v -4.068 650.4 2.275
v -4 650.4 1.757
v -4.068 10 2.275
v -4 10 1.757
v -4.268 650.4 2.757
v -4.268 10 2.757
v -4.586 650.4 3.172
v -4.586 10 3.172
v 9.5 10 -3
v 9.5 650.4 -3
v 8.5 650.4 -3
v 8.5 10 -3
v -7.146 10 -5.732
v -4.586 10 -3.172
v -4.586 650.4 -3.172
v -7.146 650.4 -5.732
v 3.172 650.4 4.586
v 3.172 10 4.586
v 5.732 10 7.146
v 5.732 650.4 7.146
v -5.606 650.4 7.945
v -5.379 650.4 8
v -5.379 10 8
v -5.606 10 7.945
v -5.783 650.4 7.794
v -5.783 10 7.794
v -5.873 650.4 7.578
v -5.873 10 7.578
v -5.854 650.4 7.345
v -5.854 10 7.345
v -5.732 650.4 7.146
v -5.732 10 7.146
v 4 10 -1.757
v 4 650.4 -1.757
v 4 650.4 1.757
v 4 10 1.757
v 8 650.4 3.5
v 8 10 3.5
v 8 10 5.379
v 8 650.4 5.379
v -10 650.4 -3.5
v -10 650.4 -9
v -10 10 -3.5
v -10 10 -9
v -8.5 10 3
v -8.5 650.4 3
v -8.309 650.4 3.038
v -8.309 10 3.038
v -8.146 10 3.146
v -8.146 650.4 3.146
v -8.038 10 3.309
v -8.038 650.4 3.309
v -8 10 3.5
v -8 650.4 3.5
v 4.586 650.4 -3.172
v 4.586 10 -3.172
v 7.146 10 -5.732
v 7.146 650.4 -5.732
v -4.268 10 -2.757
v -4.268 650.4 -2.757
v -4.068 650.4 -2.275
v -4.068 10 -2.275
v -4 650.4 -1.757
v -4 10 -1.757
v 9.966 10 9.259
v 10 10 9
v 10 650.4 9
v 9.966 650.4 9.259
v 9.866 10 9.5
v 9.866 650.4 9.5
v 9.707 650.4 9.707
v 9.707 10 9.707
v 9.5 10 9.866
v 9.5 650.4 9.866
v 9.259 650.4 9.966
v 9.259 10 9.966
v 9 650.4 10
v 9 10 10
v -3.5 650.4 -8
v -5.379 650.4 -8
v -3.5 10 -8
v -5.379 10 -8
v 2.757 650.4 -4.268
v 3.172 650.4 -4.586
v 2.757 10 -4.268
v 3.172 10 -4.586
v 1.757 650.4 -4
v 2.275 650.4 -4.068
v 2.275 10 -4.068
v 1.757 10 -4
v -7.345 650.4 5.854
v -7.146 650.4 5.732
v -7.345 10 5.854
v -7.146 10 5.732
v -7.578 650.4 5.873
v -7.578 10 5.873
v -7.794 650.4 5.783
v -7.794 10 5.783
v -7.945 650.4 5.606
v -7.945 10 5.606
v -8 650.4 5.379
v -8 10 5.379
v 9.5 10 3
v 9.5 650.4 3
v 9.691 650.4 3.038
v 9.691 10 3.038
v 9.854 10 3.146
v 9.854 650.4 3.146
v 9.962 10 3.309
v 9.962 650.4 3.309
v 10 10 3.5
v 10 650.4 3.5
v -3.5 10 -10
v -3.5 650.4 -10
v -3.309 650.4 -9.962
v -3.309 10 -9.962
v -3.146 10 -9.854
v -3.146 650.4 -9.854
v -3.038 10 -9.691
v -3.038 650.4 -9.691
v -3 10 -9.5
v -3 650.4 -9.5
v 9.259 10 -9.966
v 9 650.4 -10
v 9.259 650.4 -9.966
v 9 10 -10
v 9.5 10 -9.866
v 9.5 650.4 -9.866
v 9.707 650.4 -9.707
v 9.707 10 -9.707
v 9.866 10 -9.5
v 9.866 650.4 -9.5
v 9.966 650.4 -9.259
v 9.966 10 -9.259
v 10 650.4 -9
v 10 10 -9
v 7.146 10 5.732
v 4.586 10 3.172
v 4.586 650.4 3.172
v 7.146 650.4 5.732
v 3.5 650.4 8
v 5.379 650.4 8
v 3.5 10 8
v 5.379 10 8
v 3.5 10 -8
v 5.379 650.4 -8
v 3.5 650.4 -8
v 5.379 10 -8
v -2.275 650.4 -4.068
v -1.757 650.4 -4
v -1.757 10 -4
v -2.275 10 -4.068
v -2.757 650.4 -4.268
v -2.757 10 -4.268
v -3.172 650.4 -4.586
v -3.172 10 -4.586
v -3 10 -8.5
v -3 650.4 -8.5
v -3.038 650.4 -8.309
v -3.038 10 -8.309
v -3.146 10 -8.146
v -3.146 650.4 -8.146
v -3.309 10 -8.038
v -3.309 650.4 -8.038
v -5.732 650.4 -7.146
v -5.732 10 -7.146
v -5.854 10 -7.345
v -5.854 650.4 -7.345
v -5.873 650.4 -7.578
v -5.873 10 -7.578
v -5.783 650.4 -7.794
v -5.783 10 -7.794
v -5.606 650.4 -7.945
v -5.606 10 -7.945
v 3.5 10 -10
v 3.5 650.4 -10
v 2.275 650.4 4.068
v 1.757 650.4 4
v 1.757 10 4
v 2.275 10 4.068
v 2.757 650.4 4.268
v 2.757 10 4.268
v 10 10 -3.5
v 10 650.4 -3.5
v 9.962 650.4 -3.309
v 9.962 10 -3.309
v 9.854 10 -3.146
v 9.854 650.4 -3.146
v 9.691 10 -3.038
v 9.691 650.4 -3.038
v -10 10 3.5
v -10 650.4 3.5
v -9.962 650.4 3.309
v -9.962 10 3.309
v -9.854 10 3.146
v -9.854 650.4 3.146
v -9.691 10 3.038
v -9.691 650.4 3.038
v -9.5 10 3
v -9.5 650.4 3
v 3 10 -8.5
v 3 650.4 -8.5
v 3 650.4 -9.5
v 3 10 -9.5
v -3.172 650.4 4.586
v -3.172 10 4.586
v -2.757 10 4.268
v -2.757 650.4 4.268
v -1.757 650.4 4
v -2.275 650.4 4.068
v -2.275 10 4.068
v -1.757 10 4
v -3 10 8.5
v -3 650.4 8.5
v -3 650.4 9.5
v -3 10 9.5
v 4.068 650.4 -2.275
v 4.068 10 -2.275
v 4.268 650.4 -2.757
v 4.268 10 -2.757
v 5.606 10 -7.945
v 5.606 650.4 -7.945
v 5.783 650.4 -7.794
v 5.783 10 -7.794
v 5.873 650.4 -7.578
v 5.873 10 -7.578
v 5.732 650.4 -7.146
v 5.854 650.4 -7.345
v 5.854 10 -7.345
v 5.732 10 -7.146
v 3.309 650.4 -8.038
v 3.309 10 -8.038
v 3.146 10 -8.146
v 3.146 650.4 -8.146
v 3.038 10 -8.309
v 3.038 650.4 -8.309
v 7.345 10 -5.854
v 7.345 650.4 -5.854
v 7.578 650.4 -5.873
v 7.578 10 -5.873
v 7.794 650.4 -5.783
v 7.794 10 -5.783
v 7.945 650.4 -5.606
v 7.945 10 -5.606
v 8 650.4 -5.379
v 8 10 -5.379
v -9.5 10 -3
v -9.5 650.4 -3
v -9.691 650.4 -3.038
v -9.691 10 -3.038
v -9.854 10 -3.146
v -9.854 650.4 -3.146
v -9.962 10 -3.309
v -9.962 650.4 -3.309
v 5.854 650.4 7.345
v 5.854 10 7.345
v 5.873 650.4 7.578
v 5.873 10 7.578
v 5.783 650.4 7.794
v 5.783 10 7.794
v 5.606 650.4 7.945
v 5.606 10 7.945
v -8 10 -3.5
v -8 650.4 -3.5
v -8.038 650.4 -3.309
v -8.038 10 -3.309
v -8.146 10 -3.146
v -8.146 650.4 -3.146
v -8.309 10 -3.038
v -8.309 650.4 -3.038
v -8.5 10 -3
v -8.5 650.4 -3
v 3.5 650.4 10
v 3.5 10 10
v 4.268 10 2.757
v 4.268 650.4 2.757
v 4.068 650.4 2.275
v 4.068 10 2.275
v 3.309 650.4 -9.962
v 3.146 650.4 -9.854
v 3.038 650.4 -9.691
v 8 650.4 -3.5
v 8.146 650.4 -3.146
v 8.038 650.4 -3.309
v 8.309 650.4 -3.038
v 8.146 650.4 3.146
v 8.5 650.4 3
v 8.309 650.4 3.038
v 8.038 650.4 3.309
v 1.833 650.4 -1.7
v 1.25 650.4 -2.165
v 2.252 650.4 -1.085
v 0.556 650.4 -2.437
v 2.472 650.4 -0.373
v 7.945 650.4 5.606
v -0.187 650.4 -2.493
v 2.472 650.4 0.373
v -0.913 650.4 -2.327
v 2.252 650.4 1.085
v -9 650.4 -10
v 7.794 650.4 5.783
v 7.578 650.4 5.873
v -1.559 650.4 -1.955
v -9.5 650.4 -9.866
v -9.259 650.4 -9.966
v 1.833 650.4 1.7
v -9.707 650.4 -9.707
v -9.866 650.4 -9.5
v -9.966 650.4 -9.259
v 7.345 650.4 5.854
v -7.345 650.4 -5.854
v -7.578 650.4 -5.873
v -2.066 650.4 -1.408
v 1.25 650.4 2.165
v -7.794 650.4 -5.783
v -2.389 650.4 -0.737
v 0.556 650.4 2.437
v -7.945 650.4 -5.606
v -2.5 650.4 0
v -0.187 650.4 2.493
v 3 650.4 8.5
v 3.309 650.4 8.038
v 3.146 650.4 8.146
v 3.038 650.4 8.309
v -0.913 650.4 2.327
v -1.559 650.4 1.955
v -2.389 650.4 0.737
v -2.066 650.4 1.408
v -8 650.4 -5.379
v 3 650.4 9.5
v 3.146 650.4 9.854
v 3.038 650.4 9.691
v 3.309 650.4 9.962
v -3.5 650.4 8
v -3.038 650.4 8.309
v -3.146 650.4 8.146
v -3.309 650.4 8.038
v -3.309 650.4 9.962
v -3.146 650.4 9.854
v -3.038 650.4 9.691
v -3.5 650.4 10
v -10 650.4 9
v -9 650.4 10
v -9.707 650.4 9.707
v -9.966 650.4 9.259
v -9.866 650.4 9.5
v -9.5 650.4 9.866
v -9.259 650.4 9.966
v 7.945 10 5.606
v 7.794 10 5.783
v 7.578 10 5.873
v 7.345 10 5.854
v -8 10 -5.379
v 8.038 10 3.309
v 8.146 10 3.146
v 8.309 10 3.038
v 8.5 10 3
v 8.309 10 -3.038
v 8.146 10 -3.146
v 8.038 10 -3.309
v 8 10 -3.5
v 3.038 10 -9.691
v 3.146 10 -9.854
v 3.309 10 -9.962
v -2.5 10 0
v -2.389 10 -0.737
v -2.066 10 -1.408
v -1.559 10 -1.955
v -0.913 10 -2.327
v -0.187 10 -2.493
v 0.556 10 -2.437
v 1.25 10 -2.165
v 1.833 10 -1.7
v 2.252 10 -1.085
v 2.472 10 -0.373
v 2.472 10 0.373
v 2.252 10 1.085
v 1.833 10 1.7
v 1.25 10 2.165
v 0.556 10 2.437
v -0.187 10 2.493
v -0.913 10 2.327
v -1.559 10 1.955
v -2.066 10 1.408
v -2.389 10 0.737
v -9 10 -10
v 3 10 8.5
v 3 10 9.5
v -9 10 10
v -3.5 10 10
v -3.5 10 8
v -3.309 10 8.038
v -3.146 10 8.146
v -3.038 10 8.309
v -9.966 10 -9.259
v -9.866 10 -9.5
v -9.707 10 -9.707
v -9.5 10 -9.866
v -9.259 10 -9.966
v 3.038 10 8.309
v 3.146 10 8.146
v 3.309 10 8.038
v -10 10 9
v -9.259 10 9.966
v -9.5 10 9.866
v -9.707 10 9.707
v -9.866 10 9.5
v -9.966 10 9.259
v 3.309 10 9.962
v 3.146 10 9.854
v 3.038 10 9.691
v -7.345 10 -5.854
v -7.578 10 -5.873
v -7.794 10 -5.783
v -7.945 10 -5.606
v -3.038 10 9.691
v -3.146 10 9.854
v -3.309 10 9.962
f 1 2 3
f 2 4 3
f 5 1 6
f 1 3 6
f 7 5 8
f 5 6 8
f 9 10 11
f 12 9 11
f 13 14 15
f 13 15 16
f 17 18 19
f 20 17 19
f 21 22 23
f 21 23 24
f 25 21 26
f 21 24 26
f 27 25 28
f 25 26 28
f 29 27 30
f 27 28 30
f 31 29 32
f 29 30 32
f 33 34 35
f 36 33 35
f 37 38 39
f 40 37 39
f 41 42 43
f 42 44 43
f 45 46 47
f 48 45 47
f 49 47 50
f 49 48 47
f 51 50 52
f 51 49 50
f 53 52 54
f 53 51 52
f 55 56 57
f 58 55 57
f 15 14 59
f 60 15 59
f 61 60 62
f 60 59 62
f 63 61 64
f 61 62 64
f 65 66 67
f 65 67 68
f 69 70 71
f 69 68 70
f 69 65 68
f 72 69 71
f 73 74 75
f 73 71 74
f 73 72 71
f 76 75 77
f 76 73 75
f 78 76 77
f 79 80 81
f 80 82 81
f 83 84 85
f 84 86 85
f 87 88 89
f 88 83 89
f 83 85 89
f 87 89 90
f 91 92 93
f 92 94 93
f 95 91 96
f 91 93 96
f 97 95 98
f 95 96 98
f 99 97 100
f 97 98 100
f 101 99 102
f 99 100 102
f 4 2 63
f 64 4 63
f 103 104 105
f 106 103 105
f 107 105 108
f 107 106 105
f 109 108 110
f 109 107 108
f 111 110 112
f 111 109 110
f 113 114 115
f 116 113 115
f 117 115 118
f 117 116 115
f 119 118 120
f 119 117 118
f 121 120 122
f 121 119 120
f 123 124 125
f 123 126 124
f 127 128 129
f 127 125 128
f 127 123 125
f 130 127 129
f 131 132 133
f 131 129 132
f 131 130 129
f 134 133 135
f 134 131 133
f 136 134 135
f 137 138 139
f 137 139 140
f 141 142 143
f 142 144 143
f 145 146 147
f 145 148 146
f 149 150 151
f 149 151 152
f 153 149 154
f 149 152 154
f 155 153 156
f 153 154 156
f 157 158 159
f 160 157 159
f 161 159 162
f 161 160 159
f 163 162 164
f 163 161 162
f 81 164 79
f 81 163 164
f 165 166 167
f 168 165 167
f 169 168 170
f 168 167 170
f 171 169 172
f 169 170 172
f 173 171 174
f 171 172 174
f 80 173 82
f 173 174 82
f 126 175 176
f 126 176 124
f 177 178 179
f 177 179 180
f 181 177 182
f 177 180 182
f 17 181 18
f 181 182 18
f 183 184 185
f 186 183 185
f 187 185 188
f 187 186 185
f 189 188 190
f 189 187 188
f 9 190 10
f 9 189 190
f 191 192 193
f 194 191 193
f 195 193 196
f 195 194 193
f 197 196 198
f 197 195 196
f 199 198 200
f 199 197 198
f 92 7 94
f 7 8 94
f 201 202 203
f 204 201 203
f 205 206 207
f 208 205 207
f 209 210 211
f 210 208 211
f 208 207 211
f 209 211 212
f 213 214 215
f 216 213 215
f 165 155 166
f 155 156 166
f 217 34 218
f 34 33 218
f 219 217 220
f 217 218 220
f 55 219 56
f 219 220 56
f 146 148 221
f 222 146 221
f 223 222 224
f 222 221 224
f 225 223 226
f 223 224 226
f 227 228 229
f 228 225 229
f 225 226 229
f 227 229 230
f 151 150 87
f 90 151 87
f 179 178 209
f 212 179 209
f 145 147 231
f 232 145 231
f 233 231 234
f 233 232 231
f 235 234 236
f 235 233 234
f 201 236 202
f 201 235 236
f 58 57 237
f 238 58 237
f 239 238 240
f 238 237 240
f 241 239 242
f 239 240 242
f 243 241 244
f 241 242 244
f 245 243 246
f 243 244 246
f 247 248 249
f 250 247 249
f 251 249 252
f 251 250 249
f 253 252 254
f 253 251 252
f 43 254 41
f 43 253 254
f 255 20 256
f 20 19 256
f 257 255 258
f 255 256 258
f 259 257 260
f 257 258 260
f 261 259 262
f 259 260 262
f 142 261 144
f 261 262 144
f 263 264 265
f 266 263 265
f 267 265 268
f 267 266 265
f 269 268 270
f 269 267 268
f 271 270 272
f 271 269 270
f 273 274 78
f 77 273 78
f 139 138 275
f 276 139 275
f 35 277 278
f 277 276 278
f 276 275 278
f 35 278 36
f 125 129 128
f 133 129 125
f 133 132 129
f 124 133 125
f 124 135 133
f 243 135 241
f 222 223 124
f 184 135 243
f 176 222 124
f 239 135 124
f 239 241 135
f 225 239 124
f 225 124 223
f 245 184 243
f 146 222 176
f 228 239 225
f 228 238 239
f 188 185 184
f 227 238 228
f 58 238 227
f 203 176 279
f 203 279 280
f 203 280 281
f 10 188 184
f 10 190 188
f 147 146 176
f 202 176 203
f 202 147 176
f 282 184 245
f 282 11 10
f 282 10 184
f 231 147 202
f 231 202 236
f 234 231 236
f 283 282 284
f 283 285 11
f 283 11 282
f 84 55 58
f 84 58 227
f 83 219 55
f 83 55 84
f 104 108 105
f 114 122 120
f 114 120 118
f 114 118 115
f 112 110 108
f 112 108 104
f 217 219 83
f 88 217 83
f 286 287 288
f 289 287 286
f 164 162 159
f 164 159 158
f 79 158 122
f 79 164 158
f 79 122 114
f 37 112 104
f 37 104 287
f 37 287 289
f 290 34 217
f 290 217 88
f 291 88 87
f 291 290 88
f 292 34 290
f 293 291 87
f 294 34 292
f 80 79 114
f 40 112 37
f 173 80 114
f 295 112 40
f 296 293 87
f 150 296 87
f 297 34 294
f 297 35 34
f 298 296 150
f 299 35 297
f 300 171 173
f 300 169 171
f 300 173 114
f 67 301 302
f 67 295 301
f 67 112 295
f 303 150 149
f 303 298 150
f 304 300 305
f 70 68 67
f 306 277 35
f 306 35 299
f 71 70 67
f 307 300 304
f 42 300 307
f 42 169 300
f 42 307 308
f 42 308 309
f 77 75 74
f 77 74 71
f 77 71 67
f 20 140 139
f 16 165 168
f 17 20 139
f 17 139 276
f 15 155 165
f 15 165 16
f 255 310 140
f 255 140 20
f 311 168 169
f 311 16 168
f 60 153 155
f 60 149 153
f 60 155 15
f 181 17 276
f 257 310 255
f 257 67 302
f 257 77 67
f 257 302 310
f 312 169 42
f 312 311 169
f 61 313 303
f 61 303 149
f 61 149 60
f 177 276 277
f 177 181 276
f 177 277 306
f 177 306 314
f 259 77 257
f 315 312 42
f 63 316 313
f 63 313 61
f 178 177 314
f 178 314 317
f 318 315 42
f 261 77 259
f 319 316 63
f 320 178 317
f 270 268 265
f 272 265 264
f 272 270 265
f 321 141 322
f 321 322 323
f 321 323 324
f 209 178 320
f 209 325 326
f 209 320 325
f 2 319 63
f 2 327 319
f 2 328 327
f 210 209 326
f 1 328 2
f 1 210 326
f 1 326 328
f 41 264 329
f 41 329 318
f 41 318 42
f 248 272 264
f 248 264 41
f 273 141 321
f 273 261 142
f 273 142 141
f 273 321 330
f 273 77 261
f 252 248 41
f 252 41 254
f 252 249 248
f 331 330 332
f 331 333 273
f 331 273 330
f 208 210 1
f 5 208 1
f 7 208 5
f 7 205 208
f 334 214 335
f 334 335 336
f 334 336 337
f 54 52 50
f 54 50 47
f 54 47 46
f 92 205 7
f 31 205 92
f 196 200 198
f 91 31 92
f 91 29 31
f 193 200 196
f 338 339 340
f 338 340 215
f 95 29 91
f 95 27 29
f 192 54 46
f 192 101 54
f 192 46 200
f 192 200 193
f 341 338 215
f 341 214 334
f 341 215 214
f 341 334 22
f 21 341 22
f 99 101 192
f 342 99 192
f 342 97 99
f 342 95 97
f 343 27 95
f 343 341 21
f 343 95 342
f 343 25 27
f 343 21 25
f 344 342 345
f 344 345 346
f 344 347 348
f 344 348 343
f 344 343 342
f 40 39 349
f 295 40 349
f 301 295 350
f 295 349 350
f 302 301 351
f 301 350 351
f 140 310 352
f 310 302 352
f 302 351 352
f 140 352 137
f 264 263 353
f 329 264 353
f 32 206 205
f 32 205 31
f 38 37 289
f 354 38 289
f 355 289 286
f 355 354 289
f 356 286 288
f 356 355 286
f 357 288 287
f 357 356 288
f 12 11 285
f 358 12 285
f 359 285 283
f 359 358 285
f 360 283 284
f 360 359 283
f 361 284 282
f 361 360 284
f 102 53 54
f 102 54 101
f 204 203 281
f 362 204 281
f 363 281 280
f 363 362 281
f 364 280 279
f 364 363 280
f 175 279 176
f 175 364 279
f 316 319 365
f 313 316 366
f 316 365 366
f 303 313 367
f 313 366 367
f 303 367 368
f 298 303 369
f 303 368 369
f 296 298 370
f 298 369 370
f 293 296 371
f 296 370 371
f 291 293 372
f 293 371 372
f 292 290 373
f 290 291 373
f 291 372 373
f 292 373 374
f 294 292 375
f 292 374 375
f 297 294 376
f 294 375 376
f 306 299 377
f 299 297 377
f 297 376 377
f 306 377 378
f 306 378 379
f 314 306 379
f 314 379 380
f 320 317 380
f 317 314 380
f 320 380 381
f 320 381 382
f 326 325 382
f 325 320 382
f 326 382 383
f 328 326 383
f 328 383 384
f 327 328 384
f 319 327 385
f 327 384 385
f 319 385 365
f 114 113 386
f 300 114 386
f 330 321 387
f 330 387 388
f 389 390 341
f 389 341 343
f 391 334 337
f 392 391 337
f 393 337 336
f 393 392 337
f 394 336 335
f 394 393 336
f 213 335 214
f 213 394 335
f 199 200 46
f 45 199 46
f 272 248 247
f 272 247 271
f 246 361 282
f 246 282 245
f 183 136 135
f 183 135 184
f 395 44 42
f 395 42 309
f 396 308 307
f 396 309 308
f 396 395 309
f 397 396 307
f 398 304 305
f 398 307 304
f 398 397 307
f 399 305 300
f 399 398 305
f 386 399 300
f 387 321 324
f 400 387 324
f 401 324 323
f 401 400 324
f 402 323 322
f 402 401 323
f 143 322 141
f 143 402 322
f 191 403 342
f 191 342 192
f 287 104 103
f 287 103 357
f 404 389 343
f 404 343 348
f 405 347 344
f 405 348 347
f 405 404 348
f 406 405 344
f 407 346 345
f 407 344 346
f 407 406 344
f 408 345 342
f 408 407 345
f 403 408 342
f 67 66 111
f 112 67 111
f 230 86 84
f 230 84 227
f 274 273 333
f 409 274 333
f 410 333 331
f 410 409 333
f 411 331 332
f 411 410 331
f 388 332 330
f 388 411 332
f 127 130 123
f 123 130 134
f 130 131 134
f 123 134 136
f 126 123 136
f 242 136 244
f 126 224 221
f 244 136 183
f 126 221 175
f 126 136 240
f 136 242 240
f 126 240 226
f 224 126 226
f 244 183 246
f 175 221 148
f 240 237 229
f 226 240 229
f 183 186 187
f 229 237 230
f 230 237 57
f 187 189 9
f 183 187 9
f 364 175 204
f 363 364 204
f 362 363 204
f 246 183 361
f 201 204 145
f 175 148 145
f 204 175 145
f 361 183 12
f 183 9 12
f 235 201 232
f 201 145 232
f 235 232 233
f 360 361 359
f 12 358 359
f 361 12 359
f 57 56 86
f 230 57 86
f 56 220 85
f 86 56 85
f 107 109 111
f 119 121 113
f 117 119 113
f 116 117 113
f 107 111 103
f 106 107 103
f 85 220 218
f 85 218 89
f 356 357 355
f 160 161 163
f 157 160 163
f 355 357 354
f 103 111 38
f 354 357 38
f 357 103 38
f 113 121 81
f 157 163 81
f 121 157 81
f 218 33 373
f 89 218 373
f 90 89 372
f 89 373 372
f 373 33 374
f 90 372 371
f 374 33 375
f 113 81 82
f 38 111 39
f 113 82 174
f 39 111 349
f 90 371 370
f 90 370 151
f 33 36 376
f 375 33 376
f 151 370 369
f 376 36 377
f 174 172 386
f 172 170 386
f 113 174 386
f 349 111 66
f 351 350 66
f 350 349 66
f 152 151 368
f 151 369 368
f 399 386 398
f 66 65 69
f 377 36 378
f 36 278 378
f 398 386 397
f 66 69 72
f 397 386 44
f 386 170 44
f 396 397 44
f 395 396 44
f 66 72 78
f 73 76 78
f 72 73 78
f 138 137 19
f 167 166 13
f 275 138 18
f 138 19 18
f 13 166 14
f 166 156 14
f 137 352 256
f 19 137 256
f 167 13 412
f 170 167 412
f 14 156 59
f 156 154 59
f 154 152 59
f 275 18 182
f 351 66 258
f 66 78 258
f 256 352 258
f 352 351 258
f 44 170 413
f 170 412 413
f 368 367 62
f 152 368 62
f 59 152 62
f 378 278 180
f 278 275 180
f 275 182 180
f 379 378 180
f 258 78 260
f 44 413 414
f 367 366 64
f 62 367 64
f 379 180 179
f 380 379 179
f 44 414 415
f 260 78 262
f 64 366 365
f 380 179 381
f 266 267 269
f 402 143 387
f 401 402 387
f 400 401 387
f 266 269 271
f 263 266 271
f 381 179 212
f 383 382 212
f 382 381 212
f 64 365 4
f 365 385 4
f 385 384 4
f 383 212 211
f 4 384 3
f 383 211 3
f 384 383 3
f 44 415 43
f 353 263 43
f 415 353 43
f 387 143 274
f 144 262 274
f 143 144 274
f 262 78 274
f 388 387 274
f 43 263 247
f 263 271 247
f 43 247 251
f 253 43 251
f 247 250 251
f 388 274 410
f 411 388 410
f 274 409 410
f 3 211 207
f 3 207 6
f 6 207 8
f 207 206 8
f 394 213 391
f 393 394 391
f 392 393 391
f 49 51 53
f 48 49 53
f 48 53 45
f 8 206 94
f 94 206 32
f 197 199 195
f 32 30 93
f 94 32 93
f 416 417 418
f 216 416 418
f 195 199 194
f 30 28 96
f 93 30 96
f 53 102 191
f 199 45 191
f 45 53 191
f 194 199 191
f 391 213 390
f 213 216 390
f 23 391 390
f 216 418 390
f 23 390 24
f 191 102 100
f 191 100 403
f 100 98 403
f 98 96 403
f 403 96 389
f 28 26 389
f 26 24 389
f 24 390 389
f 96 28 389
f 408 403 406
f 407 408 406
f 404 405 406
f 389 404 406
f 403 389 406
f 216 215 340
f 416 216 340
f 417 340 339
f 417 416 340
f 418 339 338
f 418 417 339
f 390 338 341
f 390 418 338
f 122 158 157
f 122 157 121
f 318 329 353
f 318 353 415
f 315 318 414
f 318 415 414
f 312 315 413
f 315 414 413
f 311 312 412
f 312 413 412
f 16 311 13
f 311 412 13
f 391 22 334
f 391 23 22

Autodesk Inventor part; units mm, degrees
ref_plane "Start Plane" through (0, 10, 0) normal (0, 1, 0) x (-1, 0, 0)
ref_plane "End Plane" through (0, 650.4, 0) normal (0, 1, 0) x (-1, 0, 0)
sketch "Sketch" plane through (0, 0, 0) normal (0, 1, 0) x (-1, 0, 0)
  line L0 (-1.7574, 4) -> (1.7574, 4)
  line L1 (4, 1.7574) -> (4, -1.7574)
  line L2 (1.7574, -4) -> (-1.7574, -4)
  line L3 (-4, -1.7574) -> (-4, 1.7574)
  line L4 (4.5858, -3.1716) -> (7.1464, -5.7322)
  line L5 (3.1716, -4.5858) -> (5.7322, -7.1464)
  line L6 (5.3787, -8) -> (3.5, -8)
  line L7 (3, -8.5) -> (3, -9.5)
  line L8 (3.5, -10) -> (9, -10)
  line L9 (10, -9) -> (10, -3.5)
  line L10 (9.5, -3) -> (8.5, -3)
  line L11 (8, -3.5) -> (8, -5.3787)
  line L12 (4, 0) -> (-4, 0) construction
  line L13 (0, -4) -> (0, 4) construction
  arc A0 (4, -1.7574) -> (4.5858, -3.1716) centre (6, -1.7574) ccw
  arc A1 (3.1716, -4.5858) -> (1.7574, -4) centre (1.7574, -6) ccw
  arc A2 (3.5, -8) -> (3, -8.5) centre (3.5, -8.5) ccw
  arc A3 (3, -9.5) -> (3.5, -10) centre (3.5, -9.5) ccw
  arc A4 (10, -3.5) -> (9.5, -3) centre (9.5, -3.5) ccw
  arc A5 (8.5, -3) -> (8, -3.5) centre (8.5, -3.5) ccw
  arc A6 (7.1464, -5.7322) -> (8, -5.3787) centre (7.5, -5.3787) ccw
  arc A7 (5.3787, -8) -> (5.7322, -7.1464) centre (5.3787, -7.5) ccw
  arc A8 (9, -10) -> (10, -9) centre (9, -9) ccw
  line L14 (-4.5858, -3.1716) -> (-7.1464, -5.7322)
  line L15 (-3.1716, -4.5858) -> (-5.7322, -7.1464)
  line L16 (-5.3787, -8) -> (-3.5, -8)
  line L17 (-3, -8.5) -> (-3, -9.5)
  line L18 (-3.5, -10) -> (-9, -10)
  line L19 (-10, -9) -> (-10, -3.5)
  line L20 (-9.5, -3) -> (-8.5, -3)
  line L21 (-8, -3.5) -> (-8, -5.3787)
  arc A9 (-4.5858, -3.1716) -> (-4, -1.7574) centre (-6, -1.7574) ccw
  arc A10 (-1.7574, -4) -> (-3.1716, -4.5858) centre (-1.7574, -6) ccw
  arc A11 (-3, -8.5) -> (-3.5, -8) centre (-3.5, -8.5) ccw
  arc A12 (-3.5, -10) -> (-3, -9.5) centre (-3.5, -9.5) ccw
  arc A13 (-9.5, -3) -> (-10, -3.5) centre (-9.5, -3.5) ccw
  arc A14 (-8, -3.5) -> (-8.5, -3) centre (-8.5, -3.5) ccw
  arc A15 (-8, -5.3787) -> (-7.1464, -5.7322) centre (-7.5, -5.3787) ccw
  arc A16 (-5.7322, -7.1464) -> (-5.3787, -8) centre (-5.3787, -7.5) ccw
  arc A17 (-10, -9) -> (-9, -10) centre (-9, -9) ccw
  line L22 (4.5858, 3.1716) -> (7.1464, 5.7322)
  line L23 (3.1716, 4.5858) -> (5.7322, 7.1464)
  line L24 (5.3787, 8) -> (3.5, 8)
  line L25 (3, 8.5) -> (3, 9.5)
  line L26 (3.5, 10) -> (9, 10)
  line L27 (10, 9) -> (10, 3.5)
  line L28 (9.5, 3) -> (8.5, 3)
  line L29 (8, 3.5) -> (8, 5.3787)
  arc A18 (4.5858, 3.1716) -> (4, 1.7574) centre (6, 1.7574) ccw
  arc A19 (1.7574, 4) -> (3.1716, 4.5858) centre (1.7574, 6) ccw
  arc A20 (3, 8.5) -> (3.5, 8) centre (3.5, 8.5) ccw
  arc A21 (3.5, 10) -> (3, 9.5) centre (3.5, 9.5) ccw
  arc A22 (9.5, 3) -> (10, 3.5) centre (9.5, 3.5) ccw
  arc A23 (8, 3.5) -> (8.5, 3) centre (8.5, 3.5) ccw
  arc A24 (8, 5.3787) -> (7.1464, 5.7322) centre (7.5, 5.3787) ccw
  arc A25 (5.7322, 7.1464) -> (5.3787, 8) centre (5.3787, 7.5) ccw
  arc A26 (10, 9) -> (9, 10) centre (9, 9) ccw
  line L30 (-10, 9) -> (-10, 3.5)
  arc A27 (-9, 10) -> (-10, 9) centre (-9, 9) ccw
  arc A28 (-10, 3.5) -> (-9.5, 3) centre (-9.5, 3.5) ccw
  line L31 (-9.5, 3) -> (-8.5, 3)
  arc A29 (-8.5, 3) -> (-8, 3.5) centre (-8.5, 3.5) ccw
  line L32 (-8, 3.5) -> (-8, 5.3787)
  arc A30 (-7.1464, 5.7322) -> (-8, 5.3787) centre (-7.5, 5.3787) ccw
  line L33 (-4.5858, 3.1716) -> (-7.1464, 5.7322)
  line L34 (-3.1716, 4.5858) -> (-5.7322, 7.1464)
  arc A31 (-3.1716, 4.5858) -> (-1.7574, 4) centre (-1.7574, 6) ccw
  arc A32 (-4, 1.7574) -> (-4.5858, 3.1716) centre (-6, 1.7574) ccw
  arc A33 (-5.3787, 8) -> (-5.7322, 7.1464) centre (-5.3787, 7.5) ccw
  line L35 (-5.3787, 8) -> (-3.5, 8)
  arc A34 (-3.5, 8) -> (-3, 8.5) centre (-3.5, 8.5) ccw
  line L36 (-3, 8.5) -> (-3, 9.5)
  arc A35 (-3, 9.5) -> (-3.5, 10) centre (-3.5, 9.5) ccw
  line L37 (-3.5, 10) -> (-9, 10)
  circle A36 centre (0, 0) radius 2.5
  point P0 (3, -8)
  point P1 (3, -10)
  point P2 (10, -10)
  dimension "d3" = 2
  dimension "d4" = 2
  dimension "d5" = 7
  dimension "d6" = 2
  dimension "d7" = 0.5
  dimension "d8" = 1
  dimension "d9" = 20
  dimension "d10" = 20
  dimension "d11" = 8
  dimension "d13" = 5
  dimension "d14" = 8
extrude "Body" add sketch "Sketch" along normal up to surface (640.4 mm away) from surface at 10
sketch "Sketch4" plane through (0, 0, 0) normal (0, 1, 0) x (-1, 0, 0)
  line L0 (0, 0) -> (10, 0)
ref_plane "Work Plane4" through (0, 0, 0) normal (0, 0, -1) x (-1, 0, 0)
sketch "Sketch5" plane through (0, 0, 0) normal (0, 0, -1) x (-1, 0, 0)
  line L0 (-2, 10) -> (12, 10)
  line L1 (-2, 650.4) -> (12, 650.4)
  dimension "d22" = 640.4
ref_plane "Work Plane5" through (9, 10, -279.4) normal (0, -1, 0) x (1, 0, 0)
split "Split1" plane through (9, 10, -279.4) removes the side toward (0, -1, 0)
ref_plane "Work Plane6" through (9, 650.4, 0) normal (0, 1, 0) x (1, 0, 0)
split "Split2" plane through (9, 650.4, 0) removes the side toward (0, 1, 0)
equation "\"d18\" = Length + G_OFFSET_END"
equation "\"G_L\" = d22"
equation "\"Length\" = 660.4"
equation "\"G_OFFSET_END\" = -10"
properties part number "A3.3"
